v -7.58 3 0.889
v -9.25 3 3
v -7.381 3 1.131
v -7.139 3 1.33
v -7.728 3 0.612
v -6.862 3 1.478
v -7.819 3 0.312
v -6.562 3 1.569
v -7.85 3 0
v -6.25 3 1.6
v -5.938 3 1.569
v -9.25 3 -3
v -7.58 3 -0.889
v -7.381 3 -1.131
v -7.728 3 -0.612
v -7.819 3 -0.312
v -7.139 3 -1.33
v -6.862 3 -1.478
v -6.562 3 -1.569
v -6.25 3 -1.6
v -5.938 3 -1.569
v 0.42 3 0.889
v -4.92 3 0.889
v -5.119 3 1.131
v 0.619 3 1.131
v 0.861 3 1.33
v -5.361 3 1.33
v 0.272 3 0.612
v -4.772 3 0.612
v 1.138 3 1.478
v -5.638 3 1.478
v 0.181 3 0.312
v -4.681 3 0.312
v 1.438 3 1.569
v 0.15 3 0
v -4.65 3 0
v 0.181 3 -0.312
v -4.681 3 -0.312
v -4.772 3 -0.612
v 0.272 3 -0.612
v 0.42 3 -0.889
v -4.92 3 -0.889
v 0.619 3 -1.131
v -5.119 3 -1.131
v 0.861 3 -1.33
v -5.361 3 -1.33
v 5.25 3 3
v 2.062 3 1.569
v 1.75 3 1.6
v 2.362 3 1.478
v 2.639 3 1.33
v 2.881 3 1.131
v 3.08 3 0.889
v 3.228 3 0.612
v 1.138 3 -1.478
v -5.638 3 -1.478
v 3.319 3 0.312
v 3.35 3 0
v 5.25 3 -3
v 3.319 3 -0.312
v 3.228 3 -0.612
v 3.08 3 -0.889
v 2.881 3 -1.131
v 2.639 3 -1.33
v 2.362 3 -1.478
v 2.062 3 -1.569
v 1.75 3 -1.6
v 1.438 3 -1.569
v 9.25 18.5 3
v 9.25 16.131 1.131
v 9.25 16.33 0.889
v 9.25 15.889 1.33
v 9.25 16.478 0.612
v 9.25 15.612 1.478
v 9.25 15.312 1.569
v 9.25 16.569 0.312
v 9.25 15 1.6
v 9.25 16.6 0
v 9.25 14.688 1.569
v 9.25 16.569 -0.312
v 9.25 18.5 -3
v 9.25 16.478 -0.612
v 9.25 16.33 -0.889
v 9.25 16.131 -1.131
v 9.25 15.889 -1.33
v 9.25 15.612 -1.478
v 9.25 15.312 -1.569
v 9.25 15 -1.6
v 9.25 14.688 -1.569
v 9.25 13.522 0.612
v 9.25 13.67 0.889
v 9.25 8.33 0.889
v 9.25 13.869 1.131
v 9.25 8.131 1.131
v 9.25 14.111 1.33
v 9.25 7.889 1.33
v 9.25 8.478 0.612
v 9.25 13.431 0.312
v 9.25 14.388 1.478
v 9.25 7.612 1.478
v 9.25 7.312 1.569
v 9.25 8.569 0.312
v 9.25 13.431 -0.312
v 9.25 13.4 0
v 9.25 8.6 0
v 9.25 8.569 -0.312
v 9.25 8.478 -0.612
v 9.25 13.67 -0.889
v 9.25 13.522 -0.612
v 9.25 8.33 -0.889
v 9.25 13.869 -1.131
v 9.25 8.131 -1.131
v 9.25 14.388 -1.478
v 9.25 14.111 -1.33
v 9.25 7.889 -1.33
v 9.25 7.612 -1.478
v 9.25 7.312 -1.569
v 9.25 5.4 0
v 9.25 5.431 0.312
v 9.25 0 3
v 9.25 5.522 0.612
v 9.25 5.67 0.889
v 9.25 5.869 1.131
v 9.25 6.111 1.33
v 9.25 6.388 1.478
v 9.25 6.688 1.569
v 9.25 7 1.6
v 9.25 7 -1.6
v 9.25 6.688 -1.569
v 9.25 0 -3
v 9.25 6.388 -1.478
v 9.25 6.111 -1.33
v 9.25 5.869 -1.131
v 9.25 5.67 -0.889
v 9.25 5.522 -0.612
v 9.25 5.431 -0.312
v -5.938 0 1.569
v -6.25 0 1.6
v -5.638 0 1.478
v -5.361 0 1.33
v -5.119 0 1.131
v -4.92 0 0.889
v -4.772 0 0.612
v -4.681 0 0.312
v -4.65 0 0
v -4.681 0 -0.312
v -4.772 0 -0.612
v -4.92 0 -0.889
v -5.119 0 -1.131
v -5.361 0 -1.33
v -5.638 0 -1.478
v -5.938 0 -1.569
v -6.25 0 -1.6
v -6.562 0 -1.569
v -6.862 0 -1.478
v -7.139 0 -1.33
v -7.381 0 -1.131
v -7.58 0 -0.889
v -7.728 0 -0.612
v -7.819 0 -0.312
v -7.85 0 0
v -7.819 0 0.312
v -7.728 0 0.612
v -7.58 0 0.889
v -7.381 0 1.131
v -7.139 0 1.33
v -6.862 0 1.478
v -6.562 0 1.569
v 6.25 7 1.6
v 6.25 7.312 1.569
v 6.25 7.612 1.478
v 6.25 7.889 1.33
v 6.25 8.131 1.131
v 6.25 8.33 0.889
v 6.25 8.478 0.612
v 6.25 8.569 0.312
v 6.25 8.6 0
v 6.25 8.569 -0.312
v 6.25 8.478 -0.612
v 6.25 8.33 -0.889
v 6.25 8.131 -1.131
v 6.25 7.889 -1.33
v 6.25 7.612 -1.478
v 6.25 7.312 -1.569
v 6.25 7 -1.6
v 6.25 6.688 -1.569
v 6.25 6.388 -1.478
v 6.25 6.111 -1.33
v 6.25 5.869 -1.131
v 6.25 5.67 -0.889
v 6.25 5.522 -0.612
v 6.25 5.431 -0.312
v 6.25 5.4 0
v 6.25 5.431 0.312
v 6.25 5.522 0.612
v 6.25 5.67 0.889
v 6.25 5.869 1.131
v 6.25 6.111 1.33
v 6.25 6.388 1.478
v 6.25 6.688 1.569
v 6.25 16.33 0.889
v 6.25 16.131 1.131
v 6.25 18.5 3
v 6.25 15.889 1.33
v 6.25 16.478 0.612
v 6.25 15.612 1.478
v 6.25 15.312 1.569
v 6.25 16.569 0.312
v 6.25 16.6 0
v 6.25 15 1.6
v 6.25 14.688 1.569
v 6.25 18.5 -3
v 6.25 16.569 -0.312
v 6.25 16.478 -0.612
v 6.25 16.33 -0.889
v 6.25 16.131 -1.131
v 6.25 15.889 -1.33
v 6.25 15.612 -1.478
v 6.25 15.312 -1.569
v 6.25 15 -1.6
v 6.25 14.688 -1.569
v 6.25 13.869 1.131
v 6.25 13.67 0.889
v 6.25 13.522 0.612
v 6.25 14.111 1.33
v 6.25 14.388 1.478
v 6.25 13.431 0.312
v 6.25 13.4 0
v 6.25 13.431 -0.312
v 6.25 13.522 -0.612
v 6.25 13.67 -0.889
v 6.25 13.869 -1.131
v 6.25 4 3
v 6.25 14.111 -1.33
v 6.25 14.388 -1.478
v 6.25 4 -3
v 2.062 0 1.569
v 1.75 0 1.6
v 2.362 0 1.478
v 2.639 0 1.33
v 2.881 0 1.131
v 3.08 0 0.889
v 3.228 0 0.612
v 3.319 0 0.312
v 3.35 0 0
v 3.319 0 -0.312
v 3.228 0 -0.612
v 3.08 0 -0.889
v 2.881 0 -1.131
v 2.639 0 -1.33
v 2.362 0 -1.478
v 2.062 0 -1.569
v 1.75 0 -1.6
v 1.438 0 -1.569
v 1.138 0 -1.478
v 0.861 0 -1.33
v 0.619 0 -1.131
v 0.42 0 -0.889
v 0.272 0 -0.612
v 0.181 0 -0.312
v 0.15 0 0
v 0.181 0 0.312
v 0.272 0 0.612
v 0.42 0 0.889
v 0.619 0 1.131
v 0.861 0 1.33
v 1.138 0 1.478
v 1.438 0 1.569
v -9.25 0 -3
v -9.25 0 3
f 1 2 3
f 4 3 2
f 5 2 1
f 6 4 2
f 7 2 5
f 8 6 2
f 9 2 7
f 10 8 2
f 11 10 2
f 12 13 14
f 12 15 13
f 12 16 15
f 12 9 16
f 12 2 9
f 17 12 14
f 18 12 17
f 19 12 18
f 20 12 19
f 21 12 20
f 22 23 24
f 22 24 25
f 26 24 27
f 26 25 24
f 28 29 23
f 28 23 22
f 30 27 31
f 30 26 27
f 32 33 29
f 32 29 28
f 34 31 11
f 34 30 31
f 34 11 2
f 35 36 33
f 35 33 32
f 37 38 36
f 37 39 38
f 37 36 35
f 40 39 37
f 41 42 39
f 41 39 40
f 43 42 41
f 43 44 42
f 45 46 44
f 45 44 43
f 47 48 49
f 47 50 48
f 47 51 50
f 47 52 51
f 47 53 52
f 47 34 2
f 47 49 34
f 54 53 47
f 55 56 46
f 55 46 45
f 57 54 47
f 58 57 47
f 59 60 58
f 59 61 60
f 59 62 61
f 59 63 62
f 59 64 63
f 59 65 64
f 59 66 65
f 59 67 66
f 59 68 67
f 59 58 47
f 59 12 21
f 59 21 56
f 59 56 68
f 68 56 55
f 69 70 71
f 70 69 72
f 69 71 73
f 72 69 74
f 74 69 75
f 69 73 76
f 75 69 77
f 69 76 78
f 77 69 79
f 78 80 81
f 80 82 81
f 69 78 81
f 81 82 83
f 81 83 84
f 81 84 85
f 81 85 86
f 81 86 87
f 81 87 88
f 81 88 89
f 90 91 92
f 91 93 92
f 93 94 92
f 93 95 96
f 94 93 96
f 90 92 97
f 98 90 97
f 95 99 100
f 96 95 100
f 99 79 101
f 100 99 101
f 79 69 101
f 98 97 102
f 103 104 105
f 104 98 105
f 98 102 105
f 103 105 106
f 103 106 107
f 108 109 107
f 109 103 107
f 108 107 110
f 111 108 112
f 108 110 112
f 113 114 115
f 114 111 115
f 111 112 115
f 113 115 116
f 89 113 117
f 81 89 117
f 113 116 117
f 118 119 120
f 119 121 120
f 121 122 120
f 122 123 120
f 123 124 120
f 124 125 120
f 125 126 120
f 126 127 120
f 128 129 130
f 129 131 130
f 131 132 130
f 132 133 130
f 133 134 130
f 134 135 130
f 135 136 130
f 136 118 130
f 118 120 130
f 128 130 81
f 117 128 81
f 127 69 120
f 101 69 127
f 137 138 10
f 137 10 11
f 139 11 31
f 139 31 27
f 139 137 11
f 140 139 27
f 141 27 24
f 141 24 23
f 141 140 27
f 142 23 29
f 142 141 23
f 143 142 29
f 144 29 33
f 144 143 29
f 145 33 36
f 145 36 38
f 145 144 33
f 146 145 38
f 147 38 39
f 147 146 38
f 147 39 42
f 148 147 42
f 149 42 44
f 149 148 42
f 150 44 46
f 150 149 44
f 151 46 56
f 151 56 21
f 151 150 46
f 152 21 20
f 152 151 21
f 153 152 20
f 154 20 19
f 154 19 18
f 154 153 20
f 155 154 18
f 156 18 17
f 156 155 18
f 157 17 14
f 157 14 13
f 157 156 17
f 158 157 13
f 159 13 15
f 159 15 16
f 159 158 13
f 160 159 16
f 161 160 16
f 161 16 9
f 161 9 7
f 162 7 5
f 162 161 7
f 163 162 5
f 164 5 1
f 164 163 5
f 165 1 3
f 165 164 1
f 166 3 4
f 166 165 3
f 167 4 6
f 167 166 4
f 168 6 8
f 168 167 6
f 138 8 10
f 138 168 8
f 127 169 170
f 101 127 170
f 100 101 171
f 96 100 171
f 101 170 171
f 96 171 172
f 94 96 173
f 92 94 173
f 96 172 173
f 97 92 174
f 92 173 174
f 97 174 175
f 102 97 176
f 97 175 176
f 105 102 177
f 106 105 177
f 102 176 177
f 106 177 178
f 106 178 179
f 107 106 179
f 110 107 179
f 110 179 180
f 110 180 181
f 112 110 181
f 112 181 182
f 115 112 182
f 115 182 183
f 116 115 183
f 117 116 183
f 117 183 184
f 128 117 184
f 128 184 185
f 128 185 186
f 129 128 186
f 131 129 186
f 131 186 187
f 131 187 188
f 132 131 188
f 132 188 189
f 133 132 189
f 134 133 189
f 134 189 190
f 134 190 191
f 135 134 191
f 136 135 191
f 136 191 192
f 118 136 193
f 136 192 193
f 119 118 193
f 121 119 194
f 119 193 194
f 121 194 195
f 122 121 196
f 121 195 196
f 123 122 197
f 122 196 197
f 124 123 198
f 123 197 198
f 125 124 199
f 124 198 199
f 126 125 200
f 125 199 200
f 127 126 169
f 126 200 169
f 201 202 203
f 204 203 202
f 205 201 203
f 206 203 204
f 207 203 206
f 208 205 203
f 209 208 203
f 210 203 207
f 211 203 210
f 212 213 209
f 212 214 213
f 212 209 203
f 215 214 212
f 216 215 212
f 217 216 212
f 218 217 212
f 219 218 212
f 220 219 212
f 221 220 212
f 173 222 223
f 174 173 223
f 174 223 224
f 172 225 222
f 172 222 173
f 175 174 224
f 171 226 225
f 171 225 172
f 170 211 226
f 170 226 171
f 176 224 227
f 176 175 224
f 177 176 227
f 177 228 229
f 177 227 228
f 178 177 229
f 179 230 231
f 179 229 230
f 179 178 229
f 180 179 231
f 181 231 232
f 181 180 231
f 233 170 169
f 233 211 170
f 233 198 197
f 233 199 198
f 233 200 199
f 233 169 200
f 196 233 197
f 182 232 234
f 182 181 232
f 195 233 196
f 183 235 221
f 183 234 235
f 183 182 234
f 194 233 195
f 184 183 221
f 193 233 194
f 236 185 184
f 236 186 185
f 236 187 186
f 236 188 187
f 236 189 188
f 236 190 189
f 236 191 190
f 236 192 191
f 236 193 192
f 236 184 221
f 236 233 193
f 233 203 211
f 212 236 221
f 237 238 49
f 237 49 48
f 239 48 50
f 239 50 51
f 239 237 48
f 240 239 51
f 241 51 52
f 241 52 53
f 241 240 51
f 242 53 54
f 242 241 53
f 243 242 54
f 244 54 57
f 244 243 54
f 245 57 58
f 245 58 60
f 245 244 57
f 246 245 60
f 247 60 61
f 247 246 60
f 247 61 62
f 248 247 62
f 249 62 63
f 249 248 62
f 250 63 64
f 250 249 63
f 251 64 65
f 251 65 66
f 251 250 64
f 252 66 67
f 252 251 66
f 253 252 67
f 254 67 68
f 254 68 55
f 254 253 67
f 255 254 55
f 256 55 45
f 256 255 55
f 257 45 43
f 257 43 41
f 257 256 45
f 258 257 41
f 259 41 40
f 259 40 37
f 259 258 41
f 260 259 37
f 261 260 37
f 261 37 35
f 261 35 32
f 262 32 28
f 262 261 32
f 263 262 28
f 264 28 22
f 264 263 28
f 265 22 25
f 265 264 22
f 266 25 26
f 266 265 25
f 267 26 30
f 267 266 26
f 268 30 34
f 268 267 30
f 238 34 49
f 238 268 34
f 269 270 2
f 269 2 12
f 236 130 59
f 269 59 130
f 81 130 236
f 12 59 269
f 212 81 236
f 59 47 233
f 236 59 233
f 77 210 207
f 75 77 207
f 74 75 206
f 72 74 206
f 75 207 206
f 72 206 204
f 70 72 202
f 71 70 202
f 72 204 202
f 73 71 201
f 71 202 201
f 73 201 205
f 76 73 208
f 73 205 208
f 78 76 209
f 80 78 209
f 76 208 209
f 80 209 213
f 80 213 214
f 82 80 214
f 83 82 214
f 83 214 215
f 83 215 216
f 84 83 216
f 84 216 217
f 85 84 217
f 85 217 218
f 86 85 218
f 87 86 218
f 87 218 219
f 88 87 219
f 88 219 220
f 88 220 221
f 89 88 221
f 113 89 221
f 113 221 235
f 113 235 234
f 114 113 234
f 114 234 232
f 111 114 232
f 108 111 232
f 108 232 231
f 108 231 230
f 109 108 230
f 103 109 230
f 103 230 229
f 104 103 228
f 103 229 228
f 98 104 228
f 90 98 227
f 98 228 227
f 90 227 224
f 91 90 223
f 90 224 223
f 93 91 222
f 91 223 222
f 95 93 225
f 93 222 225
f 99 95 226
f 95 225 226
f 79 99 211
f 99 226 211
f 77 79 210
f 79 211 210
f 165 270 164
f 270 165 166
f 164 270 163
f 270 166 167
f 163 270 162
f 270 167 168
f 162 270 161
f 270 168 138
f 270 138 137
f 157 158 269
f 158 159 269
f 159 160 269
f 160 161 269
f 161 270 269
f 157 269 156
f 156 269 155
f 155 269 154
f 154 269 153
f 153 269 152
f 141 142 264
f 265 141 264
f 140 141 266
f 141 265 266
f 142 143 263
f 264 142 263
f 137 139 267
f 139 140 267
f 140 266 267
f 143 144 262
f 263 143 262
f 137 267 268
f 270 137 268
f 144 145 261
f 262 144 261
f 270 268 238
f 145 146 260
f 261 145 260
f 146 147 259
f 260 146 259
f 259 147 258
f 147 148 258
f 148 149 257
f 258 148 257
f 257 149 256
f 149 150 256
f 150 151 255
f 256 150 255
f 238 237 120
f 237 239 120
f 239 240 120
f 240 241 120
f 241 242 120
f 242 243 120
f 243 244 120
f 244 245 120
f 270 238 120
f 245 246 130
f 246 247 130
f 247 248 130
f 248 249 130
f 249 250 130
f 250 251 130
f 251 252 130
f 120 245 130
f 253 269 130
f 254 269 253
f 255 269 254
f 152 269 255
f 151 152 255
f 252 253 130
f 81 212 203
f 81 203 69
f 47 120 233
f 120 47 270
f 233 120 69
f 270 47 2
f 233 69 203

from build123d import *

# Parameters (mm, degrees)
SKETCH1_W           = 18.5
SKETCH1_H           = 6
SKETCH1_R           = 1.6
BOSS_EXTRUDE1_DEPTH = 3
SKETCH2_W           = 3
SKETCH2_H           = 6
BOSS_EXTRUDE2_DEPTH = 15.5
SKETCH3_R           = 1.6
CUT_EXTRUDE1_DEPTH  = 25.320773014
BOSS_EXTRUDE3_DEPTH = 6


with BuildPart() as part:
    # Sketch1 → Boss-Extrude1 (new body)
    with BuildSketch(Plane(origin=(0, 0, 0), x_dir=(1, 0, 0), z_dir=(0, 1, 0))):
        Rectangle(SKETCH1_W, SKETCH1_H)
        with Locations(Location((-6.25, 0, 0), (0, 0, 270))):
            Circle(SKETCH1_R, mode=Mode.SUBTRACT)
        with Locations(Location((1.75, 0, 0), (0, 0, 270))):
            Circle(SKETCH1_R, mode=Mode.SUBTRACT)
    extrude(amount=BOSS_EXTRUDE1_DEPTH)

    # Sketch2 → Boss-Extrude2 (add)
    with BuildSketch(Plane(origin=(0, 3, 0), x_dir=(1, 0, 0), z_dir=(0, 1, 0))):
        with Locations((7.75, 0)):
            Rectangle(SKETCH2_W, SKETCH2_H)
    extrude(amount=BOSS_EXTRUDE2_DEPTH)

    # Sketch3 → Cut-Extrude1 (cut, through all)
    with BuildSketch(Plane.ZY.offset(-6.25)):
        with Locations((0, 7)):
            Circle(SKETCH3_R)
        with Locations((0, 15)):
            Circle(SKETCH3_R)
    extrude(amount=-CUT_EXTRUDE1_DEPTH, mode=Mode.SUBTRACT)

    # Sketch5 → Boss-Extrude3 (add)
    with BuildSketch(Plane(origin=(6.25, 3, 3), x_dir=(1, 0, 0), z_dir=(0, 0, 1))):
        Polygon((-1, 0), (0, 1), (0, 0), align=None)
    extrude(amount=-BOSS_EXTRUDE3_DEPTH)


solid = part.part
